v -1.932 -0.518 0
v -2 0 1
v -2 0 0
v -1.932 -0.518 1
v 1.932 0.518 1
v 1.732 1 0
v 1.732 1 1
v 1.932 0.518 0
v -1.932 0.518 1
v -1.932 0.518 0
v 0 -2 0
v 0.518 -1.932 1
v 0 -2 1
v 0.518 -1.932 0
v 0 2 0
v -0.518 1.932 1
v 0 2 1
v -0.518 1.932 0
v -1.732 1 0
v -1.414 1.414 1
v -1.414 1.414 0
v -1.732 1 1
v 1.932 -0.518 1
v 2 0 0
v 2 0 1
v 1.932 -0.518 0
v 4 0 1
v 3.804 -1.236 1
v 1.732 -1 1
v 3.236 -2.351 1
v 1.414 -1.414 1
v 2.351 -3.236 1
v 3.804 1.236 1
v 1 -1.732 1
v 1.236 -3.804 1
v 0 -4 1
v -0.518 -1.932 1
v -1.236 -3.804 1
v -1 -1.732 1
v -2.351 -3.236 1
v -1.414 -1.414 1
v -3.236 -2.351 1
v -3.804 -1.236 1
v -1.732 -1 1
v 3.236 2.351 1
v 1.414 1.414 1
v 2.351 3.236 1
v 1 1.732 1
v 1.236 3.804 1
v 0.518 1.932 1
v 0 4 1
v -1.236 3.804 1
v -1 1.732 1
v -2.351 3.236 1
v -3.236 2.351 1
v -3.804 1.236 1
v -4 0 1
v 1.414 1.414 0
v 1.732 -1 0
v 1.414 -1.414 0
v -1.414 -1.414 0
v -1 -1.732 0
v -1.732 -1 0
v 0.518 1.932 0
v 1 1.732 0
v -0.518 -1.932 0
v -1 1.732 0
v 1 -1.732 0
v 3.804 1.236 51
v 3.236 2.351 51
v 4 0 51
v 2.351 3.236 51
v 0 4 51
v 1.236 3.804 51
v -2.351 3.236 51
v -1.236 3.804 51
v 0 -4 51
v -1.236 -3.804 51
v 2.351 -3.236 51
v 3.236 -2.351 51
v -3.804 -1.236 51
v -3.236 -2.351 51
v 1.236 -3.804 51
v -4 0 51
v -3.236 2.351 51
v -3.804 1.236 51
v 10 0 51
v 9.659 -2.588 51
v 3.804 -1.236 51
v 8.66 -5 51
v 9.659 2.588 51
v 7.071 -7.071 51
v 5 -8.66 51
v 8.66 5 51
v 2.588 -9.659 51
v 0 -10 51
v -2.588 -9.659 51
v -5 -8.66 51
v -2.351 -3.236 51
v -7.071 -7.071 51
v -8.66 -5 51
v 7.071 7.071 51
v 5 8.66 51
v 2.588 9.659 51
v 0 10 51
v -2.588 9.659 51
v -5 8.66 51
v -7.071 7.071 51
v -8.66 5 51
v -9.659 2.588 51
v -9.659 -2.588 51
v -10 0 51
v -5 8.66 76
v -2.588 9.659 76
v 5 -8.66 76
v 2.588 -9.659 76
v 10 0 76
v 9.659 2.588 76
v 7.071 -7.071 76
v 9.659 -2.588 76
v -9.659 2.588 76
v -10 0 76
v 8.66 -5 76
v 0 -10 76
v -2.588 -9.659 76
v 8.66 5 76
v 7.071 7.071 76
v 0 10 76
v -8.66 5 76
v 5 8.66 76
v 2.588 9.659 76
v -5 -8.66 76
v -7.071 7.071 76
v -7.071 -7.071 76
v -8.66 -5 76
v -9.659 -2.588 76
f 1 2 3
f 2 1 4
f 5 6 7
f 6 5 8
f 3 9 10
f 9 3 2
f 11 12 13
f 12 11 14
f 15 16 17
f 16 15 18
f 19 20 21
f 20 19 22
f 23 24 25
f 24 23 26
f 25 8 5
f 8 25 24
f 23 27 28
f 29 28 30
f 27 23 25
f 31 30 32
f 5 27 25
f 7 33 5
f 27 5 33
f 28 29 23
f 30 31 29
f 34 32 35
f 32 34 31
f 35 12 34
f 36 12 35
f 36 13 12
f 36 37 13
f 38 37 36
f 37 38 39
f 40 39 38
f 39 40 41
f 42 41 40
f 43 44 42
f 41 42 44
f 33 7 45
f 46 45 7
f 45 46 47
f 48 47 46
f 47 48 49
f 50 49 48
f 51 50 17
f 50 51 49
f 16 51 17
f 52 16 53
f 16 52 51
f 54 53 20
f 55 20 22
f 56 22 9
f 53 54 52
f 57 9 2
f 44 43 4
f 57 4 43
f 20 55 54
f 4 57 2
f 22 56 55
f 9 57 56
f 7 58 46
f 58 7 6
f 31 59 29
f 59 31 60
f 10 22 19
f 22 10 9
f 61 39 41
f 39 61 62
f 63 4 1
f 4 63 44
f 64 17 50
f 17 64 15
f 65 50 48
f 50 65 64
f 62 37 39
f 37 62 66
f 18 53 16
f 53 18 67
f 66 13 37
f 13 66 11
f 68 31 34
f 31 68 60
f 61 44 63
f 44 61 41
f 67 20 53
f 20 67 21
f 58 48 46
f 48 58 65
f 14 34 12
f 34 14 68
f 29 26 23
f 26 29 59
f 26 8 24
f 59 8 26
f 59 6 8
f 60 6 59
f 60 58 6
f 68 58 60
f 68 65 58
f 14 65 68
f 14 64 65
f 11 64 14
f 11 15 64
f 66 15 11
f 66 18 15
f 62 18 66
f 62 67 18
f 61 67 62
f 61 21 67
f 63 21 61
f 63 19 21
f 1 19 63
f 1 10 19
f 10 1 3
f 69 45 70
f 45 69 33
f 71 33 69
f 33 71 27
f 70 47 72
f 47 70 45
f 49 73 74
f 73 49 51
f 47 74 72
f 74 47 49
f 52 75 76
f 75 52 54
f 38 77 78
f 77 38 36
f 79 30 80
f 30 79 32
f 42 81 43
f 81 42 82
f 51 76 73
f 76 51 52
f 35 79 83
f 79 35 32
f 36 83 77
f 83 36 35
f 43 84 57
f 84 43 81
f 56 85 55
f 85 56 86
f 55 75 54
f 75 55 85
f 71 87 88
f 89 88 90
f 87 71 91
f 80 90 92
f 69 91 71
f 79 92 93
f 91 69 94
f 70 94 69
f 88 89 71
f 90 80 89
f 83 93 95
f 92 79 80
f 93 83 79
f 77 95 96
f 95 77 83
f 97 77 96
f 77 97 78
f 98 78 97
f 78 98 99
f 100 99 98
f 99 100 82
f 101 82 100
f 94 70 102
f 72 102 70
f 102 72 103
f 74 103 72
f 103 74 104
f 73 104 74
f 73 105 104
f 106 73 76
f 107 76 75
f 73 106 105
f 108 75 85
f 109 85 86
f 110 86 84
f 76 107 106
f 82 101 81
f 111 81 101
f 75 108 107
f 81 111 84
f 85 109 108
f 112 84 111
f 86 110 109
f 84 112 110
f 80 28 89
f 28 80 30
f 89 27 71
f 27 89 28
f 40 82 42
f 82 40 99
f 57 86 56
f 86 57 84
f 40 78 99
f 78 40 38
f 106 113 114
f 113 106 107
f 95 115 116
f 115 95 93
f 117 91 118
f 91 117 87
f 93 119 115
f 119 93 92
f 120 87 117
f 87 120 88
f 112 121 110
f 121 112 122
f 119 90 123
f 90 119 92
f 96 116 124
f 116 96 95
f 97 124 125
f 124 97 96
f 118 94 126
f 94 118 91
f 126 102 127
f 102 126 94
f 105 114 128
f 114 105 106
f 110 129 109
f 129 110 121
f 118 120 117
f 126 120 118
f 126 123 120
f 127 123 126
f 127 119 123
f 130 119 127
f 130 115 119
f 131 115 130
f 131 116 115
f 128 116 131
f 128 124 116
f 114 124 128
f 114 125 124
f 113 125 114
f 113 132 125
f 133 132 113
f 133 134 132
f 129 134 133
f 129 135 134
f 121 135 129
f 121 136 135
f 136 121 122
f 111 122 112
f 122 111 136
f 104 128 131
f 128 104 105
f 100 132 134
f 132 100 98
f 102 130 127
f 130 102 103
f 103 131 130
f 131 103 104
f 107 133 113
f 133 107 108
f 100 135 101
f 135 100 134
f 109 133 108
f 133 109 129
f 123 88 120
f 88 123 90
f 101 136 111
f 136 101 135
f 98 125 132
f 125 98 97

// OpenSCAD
// force_jig.scad
// Force-test jig for measuring pin detent strength against finger pressure.
// Used at all gates G1, G6, G9.

PIN_DIAMETER = 1.5;
JIG_TIP_DIA = 4.0;        // mm, mimics finger contact patch on a single dot
JIG_TIP_HEIGHT = 1.0;
SHAFT_DIA = 8.0;
SHAFT_LENGTH = 50.0;
HANDLE_DIA = 20.0;
HANDLE_LENGTH = 25.0;

module force_jig() {
    union() {
        // Contact tip
        cylinder(d=JIG_TIP_DIA, h=JIG_TIP_HEIGHT, $fn=24);

        // Shaft
        translate([0, 0, JIG_TIP_HEIGHT])
            cylinder(d=SHAFT_DIA, h=SHAFT_LENGTH, $fn=20);

        // Handle (textured for grip)
        translate([0, 0, JIG_TIP_HEIGHT + SHAFT_LENGTH])
            cylinder(d=HANDLE_DIA, h=HANDLE_LENGTH, $fn=24);
    }
}

force_jig();

// =================================================================
// USAGE
// =================================================================
// 1. Place display on a kitchen scale (top plate facing up).
// 2. Tare scale to zero.
// 3. Holding the jig handle, gently press the tip down on a single
//    raised pin.
// 4. Watch the scale reading rise as you press.
// 5. Continue pressing until the pin sinks (you'll feel the "give").
// 6. Note the force at sink. This is the pin's detent hold force.
// 7. Repeat for 8-20 random pins; record results.
//
// Pass: average force >= 150 g.
//
// Print: PETG, 0.20 mm layer, 4 perimeters, 50% infill (jig must be
// stiff and dimensionally stable).
